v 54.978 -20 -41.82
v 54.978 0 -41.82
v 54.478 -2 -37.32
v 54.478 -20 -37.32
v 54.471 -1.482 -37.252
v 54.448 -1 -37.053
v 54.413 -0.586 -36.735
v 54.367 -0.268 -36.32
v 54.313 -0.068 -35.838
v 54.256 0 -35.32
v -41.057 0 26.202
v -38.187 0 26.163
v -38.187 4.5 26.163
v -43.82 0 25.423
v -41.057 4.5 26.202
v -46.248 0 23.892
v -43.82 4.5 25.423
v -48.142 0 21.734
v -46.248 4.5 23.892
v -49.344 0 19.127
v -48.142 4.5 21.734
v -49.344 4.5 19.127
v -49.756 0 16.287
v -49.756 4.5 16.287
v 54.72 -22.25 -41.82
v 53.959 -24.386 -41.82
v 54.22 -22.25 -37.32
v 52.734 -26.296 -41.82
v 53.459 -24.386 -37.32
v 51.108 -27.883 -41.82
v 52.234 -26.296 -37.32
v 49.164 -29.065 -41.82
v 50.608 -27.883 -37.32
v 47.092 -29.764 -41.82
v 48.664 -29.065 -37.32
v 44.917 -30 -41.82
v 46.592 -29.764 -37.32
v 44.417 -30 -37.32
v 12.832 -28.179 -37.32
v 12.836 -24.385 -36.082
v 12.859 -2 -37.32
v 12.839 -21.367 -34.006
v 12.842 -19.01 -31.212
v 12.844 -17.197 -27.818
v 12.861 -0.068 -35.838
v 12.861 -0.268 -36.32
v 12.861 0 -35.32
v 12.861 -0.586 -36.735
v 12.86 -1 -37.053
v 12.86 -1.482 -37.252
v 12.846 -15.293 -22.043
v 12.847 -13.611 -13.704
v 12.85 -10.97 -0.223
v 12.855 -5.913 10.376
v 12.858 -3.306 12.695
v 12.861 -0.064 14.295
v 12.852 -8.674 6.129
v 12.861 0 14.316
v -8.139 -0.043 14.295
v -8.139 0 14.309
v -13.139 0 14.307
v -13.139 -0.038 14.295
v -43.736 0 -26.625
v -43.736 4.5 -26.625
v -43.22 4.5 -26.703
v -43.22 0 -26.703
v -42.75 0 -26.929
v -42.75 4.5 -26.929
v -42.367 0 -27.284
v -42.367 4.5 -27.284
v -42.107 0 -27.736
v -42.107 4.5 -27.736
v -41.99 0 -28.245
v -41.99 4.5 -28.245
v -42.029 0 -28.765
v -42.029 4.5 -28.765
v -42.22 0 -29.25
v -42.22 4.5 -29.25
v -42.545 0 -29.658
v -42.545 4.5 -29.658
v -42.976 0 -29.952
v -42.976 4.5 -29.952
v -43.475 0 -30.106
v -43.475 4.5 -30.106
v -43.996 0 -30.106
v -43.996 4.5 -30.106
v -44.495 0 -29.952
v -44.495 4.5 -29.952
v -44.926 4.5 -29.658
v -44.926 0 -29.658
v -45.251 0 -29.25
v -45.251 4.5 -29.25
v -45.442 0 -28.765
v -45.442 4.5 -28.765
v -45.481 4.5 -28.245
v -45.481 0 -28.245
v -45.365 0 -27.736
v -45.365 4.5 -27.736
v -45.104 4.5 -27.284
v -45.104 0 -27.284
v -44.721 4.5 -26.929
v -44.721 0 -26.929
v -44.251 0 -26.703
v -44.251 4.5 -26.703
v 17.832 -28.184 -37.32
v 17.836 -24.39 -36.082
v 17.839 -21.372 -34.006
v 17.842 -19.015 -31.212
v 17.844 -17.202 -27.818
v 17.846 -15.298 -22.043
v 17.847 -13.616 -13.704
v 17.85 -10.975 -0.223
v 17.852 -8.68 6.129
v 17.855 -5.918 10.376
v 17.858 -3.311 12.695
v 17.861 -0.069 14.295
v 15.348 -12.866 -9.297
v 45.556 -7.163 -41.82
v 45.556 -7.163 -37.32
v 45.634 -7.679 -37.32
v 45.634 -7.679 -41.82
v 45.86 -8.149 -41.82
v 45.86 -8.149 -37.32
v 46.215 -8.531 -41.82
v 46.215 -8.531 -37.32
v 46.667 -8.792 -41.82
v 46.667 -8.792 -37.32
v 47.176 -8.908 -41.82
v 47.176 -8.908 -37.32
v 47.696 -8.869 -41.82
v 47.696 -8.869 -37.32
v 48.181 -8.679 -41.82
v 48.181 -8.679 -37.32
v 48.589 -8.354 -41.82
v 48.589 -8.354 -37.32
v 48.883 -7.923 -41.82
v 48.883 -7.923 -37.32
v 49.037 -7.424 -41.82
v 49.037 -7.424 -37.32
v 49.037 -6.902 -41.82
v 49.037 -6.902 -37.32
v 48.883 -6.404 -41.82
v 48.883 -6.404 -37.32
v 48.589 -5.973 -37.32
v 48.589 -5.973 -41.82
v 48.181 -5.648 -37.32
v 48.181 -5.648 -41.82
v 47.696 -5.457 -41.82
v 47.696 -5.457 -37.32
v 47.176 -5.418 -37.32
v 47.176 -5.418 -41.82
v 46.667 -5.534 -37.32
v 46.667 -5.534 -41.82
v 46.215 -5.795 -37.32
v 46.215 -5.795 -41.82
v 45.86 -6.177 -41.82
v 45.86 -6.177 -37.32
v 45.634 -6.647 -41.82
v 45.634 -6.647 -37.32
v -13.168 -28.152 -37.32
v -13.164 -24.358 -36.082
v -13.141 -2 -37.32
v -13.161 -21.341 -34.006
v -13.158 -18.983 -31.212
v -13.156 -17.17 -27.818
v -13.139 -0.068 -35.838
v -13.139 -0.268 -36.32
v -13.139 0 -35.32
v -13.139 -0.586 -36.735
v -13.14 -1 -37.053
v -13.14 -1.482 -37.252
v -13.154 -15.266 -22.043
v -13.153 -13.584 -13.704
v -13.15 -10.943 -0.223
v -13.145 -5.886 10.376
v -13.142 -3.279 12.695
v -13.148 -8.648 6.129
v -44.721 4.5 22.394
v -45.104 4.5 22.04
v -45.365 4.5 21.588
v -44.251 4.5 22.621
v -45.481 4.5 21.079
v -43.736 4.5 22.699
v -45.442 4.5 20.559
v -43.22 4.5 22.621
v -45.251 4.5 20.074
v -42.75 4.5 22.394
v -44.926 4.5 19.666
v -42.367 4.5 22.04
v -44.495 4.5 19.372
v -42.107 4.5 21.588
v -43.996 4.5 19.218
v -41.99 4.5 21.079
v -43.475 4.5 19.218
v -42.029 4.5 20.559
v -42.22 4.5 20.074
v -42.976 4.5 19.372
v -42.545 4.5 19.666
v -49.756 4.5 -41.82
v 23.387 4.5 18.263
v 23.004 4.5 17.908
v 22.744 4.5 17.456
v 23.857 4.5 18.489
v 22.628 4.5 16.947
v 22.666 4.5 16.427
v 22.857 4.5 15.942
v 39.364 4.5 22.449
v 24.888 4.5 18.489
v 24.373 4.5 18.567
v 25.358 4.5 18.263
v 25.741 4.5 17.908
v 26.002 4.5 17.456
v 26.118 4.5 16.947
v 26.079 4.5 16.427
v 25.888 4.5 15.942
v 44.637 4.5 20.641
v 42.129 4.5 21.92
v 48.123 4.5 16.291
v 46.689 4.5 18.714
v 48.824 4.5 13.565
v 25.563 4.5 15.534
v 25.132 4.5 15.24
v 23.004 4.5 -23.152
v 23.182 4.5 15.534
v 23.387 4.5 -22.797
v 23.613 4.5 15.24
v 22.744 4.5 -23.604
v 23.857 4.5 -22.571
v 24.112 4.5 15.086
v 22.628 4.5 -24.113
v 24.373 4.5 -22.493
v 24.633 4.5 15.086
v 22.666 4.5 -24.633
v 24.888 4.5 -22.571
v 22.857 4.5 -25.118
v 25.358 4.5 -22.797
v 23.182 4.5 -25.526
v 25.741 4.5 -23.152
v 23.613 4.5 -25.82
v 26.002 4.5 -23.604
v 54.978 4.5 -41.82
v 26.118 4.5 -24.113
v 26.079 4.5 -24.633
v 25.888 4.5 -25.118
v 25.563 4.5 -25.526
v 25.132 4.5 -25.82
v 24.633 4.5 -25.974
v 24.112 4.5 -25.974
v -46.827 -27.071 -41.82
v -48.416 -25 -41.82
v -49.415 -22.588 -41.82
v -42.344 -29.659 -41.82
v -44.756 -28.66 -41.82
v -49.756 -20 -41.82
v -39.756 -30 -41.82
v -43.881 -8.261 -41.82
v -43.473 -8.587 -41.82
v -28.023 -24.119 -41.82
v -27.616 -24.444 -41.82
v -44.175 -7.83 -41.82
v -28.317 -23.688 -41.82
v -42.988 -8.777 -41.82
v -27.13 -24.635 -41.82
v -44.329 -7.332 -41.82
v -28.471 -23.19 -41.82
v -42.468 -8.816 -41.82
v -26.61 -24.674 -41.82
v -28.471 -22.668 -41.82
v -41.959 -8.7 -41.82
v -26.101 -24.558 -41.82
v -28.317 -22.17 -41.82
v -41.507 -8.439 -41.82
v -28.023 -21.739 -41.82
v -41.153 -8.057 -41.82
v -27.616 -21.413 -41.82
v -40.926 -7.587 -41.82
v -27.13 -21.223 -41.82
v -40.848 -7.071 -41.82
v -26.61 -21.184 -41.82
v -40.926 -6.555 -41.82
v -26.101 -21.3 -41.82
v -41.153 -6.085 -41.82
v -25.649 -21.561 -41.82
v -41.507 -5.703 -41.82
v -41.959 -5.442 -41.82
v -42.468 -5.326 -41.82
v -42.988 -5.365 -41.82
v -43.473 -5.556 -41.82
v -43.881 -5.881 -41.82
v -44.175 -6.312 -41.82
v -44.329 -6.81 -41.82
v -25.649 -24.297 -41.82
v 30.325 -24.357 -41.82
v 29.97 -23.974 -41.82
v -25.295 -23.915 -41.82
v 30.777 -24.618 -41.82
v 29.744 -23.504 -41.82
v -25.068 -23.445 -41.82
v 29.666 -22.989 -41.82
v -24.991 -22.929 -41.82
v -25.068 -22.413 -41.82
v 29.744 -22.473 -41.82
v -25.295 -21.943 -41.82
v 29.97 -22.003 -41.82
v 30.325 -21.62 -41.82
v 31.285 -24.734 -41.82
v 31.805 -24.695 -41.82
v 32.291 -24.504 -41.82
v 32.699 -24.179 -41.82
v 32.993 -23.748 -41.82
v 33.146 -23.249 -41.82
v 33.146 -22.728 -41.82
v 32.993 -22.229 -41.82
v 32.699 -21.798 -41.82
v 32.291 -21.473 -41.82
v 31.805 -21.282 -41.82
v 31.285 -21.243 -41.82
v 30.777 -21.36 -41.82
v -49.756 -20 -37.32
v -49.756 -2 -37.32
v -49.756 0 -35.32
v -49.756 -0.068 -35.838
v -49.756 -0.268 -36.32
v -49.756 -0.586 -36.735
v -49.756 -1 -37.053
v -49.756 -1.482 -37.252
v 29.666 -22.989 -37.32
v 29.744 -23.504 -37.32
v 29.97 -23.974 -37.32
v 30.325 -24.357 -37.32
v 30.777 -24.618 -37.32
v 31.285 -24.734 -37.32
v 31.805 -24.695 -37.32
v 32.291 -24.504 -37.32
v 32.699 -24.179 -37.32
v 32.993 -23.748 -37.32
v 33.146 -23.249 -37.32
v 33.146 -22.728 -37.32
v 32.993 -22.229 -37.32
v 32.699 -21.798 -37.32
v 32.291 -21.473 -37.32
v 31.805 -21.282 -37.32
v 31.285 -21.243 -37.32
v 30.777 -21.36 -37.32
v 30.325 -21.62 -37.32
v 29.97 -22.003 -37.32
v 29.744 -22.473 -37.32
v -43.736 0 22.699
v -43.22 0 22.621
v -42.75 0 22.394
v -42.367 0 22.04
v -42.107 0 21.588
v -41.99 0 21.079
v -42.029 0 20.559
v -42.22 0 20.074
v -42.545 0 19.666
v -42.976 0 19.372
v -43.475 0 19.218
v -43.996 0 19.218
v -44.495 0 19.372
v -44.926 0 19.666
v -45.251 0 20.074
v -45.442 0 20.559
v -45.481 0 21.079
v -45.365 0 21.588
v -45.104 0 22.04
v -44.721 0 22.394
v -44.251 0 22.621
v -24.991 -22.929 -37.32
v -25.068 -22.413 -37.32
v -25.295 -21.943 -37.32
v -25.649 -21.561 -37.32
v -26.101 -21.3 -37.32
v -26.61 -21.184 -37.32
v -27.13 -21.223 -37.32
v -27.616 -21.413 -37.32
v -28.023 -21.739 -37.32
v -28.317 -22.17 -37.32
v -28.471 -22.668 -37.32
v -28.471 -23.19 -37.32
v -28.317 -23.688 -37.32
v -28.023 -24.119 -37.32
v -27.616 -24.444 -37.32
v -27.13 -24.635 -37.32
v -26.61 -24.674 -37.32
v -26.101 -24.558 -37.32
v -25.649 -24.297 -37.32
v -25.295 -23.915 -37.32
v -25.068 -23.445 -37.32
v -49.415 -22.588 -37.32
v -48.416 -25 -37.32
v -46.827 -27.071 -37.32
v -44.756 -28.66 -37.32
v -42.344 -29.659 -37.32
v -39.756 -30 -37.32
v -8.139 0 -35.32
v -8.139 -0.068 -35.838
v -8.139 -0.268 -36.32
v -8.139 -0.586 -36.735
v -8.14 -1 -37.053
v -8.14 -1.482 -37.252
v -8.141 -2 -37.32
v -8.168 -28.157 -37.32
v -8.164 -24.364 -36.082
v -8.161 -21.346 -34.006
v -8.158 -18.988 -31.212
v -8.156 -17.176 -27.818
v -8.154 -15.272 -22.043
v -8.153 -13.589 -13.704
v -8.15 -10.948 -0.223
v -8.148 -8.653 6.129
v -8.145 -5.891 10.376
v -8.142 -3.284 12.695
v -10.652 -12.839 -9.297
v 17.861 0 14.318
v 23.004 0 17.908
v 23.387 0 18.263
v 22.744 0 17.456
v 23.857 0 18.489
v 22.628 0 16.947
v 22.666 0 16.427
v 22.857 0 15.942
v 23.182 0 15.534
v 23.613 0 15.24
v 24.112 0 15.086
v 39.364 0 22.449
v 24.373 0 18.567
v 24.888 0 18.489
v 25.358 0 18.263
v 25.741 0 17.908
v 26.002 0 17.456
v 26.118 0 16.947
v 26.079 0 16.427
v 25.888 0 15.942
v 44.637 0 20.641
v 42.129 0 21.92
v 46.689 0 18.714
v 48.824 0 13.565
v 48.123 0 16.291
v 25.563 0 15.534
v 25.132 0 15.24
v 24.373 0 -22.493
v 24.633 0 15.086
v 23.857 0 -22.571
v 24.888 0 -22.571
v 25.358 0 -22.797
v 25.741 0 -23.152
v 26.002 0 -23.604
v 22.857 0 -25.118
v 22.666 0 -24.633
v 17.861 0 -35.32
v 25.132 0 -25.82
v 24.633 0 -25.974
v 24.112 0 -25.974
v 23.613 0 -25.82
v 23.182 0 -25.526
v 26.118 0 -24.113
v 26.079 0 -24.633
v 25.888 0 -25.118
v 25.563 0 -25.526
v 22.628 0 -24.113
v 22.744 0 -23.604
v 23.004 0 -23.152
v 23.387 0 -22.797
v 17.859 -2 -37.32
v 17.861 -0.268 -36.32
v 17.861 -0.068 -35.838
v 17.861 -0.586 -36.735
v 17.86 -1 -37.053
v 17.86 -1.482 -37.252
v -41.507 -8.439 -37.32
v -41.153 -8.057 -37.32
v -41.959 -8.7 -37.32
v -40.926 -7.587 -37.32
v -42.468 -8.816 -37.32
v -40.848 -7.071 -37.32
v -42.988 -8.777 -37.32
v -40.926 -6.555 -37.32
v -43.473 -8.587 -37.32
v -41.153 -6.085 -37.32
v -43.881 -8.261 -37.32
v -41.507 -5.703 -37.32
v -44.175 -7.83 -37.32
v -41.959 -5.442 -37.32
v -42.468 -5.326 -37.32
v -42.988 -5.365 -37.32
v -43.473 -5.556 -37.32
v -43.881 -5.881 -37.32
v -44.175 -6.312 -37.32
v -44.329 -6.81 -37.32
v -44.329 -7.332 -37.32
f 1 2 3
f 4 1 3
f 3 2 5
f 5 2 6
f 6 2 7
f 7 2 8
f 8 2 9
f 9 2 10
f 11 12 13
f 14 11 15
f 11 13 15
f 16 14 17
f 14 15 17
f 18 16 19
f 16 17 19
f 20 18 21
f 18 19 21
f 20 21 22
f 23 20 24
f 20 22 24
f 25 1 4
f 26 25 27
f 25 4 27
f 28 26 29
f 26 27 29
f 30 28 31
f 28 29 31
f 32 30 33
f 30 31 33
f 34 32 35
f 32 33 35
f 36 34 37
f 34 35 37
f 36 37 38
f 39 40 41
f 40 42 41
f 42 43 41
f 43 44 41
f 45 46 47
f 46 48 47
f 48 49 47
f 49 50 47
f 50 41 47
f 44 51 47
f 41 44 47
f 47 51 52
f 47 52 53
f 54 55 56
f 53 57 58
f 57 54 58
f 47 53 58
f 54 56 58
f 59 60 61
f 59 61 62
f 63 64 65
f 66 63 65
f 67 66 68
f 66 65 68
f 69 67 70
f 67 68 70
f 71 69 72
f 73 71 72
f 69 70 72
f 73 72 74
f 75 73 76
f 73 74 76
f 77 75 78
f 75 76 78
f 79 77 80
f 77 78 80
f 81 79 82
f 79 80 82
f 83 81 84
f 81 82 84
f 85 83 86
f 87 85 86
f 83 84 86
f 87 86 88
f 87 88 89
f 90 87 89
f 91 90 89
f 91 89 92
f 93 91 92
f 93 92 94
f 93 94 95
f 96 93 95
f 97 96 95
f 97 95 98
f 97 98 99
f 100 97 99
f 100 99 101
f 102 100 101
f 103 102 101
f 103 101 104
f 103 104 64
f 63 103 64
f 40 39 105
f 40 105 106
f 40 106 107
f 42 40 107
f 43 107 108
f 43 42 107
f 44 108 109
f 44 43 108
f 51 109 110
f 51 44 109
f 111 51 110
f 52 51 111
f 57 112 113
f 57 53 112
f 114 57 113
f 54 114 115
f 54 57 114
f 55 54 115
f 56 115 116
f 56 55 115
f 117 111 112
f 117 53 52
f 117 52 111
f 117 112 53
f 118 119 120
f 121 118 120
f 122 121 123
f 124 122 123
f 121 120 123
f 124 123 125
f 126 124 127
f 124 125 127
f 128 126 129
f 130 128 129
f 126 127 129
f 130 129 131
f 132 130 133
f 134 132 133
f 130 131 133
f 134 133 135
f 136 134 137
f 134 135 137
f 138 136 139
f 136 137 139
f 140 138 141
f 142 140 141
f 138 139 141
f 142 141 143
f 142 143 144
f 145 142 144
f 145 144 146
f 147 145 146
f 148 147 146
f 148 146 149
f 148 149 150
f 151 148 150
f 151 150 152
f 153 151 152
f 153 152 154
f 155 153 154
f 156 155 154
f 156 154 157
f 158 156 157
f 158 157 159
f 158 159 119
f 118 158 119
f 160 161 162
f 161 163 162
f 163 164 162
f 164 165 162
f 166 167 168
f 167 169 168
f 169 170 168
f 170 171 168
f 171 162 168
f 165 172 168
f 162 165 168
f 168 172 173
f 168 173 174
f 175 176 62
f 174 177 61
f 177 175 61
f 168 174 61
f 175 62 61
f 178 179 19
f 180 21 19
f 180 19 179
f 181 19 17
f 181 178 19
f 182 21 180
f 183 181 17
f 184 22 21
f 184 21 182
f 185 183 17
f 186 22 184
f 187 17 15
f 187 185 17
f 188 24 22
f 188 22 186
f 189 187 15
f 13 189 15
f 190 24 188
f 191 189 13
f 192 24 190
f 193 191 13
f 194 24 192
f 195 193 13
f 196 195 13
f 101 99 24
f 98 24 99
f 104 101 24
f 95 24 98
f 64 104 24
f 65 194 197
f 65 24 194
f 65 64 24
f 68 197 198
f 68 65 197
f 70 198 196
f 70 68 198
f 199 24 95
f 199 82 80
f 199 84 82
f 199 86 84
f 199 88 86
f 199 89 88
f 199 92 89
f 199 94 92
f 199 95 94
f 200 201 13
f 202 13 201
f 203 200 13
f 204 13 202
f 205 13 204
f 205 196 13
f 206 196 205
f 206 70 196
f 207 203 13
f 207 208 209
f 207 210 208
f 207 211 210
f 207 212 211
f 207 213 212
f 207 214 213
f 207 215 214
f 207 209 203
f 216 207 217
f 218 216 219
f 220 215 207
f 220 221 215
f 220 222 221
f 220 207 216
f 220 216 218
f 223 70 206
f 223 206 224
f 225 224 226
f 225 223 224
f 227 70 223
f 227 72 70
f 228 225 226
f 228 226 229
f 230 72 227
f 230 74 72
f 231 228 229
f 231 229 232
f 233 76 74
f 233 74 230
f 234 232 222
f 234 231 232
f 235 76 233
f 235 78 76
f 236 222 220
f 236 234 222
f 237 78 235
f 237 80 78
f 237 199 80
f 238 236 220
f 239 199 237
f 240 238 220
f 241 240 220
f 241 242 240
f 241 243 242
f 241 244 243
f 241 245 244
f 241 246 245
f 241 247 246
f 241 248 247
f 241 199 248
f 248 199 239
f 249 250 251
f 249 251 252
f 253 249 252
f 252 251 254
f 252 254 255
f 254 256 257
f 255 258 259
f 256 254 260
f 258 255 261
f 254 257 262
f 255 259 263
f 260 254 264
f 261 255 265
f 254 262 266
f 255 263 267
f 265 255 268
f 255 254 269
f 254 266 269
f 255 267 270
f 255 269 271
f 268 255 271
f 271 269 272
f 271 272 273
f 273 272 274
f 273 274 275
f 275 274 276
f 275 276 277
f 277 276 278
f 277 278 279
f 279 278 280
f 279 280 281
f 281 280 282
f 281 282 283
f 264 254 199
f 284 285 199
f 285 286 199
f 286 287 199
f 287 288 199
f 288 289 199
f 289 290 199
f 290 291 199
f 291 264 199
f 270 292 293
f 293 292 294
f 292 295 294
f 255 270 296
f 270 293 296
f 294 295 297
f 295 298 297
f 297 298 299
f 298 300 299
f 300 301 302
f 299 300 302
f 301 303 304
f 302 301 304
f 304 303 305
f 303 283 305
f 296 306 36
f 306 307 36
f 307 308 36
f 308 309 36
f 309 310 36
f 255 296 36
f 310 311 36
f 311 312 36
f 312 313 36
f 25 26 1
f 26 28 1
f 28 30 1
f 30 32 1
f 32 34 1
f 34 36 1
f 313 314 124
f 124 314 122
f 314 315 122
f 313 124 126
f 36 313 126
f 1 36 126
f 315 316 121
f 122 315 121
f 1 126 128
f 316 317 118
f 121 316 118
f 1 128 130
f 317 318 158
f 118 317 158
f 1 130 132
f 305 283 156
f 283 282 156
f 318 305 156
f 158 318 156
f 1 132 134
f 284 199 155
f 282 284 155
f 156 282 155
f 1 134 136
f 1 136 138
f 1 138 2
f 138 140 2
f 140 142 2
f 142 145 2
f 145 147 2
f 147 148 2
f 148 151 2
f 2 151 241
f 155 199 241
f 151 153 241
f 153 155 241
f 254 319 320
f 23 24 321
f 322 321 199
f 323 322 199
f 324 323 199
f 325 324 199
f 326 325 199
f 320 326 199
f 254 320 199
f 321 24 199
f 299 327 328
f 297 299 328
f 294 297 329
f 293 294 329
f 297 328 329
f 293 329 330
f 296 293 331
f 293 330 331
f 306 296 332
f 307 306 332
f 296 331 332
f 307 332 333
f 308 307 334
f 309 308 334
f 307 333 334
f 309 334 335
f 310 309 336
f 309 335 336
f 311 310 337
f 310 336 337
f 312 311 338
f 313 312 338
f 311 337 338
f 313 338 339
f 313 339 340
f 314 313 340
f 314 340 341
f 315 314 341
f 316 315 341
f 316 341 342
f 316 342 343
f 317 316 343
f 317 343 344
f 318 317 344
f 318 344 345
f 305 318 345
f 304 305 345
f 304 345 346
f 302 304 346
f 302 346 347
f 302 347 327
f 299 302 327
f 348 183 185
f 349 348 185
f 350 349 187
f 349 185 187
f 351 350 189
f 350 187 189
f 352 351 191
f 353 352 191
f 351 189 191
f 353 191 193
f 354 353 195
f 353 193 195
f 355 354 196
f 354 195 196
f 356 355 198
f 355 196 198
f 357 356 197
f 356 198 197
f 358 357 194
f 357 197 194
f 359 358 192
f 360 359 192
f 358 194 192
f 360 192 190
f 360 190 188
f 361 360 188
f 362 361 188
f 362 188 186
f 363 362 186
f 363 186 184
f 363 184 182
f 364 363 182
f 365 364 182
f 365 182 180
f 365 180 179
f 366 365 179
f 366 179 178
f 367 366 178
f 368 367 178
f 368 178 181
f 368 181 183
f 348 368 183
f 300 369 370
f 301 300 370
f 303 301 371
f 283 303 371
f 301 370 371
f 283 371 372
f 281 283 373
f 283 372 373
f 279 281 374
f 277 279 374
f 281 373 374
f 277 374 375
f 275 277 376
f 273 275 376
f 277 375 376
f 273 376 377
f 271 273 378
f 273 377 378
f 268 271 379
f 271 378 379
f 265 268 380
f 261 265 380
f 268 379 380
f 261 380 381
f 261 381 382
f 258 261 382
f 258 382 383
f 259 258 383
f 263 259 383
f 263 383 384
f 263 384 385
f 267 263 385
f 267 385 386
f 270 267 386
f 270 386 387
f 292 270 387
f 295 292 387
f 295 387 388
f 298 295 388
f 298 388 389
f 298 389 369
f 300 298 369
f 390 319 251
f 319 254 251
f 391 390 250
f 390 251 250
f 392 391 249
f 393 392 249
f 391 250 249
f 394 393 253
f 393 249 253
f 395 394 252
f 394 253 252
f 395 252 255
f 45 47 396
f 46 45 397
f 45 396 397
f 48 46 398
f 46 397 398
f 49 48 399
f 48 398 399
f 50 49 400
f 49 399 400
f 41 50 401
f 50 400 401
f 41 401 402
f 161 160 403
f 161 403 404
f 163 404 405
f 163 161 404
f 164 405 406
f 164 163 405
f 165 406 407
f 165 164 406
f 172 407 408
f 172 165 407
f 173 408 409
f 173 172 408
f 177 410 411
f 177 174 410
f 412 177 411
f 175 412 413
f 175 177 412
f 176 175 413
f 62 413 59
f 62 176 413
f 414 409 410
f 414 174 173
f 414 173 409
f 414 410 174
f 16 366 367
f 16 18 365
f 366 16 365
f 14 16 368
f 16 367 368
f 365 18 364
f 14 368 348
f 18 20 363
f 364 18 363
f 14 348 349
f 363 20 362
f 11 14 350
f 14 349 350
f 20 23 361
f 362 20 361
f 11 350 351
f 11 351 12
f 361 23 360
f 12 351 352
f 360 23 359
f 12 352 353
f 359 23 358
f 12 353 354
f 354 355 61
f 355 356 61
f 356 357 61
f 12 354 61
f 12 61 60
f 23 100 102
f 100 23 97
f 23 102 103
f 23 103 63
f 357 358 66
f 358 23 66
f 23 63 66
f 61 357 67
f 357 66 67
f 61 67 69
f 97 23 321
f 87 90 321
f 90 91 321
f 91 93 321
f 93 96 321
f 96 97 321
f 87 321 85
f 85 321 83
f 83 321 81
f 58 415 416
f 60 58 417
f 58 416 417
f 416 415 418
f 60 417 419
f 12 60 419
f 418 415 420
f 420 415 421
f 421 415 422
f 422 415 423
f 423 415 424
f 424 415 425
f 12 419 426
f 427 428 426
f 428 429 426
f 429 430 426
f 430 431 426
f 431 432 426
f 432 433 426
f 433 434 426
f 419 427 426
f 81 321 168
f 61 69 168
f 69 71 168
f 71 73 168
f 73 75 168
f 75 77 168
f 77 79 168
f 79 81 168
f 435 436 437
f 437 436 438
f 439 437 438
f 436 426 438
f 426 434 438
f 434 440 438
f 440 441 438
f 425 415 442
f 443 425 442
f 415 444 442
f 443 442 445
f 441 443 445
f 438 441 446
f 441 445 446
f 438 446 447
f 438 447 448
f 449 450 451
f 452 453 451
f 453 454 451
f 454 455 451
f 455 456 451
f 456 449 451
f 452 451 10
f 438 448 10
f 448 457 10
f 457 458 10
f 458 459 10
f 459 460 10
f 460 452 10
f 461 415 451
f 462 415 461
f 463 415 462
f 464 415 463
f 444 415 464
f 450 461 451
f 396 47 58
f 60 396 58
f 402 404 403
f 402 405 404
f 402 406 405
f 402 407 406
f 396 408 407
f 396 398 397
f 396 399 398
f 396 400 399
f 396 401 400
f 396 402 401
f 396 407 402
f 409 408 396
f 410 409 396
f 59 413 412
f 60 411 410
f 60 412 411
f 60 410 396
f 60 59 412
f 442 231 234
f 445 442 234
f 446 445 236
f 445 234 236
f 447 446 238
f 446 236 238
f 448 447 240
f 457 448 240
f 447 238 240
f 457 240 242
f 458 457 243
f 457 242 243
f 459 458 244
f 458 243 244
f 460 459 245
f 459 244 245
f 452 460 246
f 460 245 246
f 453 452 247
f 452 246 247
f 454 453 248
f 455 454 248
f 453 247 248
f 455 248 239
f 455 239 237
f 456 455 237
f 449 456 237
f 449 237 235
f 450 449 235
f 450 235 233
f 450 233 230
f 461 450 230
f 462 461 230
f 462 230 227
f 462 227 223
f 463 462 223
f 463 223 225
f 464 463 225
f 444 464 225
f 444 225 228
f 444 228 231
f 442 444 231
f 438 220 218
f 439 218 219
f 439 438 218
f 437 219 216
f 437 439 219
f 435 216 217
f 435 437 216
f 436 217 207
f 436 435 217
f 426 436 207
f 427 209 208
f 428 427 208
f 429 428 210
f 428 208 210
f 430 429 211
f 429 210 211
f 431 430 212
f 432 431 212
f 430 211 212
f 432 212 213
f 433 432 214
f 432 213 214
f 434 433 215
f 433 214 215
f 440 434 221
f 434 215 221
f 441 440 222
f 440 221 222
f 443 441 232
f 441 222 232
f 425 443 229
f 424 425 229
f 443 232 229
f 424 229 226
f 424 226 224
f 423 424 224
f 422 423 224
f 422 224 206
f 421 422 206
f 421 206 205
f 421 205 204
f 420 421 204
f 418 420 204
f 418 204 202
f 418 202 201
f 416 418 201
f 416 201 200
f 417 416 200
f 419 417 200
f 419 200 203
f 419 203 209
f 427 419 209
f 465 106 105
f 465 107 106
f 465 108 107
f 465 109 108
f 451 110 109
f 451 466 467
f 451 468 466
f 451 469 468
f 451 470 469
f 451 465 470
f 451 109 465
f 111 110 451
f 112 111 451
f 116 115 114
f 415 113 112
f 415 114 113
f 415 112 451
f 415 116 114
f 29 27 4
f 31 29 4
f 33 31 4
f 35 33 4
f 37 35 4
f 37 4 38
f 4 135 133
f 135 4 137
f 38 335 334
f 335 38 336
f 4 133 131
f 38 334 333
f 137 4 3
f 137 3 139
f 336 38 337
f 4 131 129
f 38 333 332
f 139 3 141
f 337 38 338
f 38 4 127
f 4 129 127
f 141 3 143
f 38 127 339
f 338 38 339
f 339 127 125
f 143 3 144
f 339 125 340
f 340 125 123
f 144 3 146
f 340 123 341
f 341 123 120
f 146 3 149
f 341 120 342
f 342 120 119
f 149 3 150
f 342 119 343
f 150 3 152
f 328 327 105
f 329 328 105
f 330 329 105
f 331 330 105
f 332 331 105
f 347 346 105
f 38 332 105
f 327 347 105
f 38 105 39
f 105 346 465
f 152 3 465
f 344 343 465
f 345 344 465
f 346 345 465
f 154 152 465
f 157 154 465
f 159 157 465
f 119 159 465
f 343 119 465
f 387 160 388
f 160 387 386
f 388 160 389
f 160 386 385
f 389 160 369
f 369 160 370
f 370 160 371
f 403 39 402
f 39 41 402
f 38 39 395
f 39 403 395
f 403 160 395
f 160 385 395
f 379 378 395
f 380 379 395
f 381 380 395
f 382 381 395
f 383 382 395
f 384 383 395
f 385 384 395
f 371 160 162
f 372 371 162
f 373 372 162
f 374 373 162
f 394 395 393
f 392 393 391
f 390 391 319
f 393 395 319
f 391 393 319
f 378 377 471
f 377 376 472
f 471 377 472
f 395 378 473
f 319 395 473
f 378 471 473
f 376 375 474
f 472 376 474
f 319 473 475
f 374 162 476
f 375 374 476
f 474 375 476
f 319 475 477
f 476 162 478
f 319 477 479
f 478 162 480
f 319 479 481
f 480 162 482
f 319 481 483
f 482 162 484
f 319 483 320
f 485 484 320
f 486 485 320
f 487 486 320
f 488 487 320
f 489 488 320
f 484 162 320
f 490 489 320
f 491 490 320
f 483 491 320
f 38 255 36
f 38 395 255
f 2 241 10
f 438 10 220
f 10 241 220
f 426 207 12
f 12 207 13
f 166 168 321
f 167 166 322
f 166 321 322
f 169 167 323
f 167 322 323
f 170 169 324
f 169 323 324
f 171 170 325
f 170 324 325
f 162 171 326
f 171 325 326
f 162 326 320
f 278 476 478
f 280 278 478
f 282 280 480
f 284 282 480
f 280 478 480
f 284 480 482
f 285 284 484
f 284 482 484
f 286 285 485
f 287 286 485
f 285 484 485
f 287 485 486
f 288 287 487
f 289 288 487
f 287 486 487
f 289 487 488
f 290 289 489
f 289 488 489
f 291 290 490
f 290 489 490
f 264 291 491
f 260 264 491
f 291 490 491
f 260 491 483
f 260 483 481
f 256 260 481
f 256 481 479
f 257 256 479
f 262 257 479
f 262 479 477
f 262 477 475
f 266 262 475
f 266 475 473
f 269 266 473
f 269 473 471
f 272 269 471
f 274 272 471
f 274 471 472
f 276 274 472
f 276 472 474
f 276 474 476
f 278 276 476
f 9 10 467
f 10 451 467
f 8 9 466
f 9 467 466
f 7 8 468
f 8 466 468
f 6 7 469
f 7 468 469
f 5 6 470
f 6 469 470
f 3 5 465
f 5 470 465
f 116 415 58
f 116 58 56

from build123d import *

# Parameters (mm, degrees)
SKETCH2_W           = 132.54933421
SKETCH2_H           = 96.472398488
BOSS_EXTRUDE1_DEPTH = 4.5
CUT_EXTRUDE1_REACH  = 84.093
SKETCH3_R           = 1.75
CUT_EXTRUDE2_REACH  = 84.093
SKETCH4_W           = 132.54933421
SKETCH4_H           = 96.472398488
FILLET1_R           = 10
BOSS_EXTRUDE2_DEPTH = 30
FILLET2_R           = 10
CUT_EXTRUDE3_REACH  = 91.266
SKETCH6_R           = 1.75
RIB1_START          = -2.5
RIB1_DEPTH          = 5
RIB2_START          = -2.5
RIB2_DEPTH          = 5
FILLET3_R           = 2


with BuildPart() as part:
    # Sketch2 → Boss-Extrude1 (new body)
    with BuildSketch(Plane(origin=(0, 0, 0), x_dir=(1, 0, 0), z_dir=(0, 1, 0))):
        Rectangle(SKETCH2_W, SKETCH2_H)
    extrude(amount=BOSS_EXTRUDE1_DEPTH)

    # Sketch3 → Cut-Extrude1 (cut, up to next)
    with BuildSketch(Plane(origin=(0, 4.5, 0), x_dir=(1, 0, 0), z_dir=(0, 1, 0)), mode=Mode.PRIVATE) as cut_extrude1_sk1:
        with Locations(Location((-43.735552551, 28.375291395, 0), (0, 0, 270))):
            Circle(SKETCH3_R)
    cut_extrude1_tool1 = extrude(cut_extrude1_sk1.sketch, amount=-CUT_EXTRUDE1_REACH, mode=Mode.PRIVATE) & part.part
    # Sketch3 → Cut-Extrude1 (cut, up to next)
    with BuildSketch(Plane(origin=(0, 4.5, 0), x_dir=(1, 0, 0), z_dir=(0, 1, 0)), mode=Mode.PRIVATE) as cut_extrude1_sk2:
        with Locations(Location((-43.735552551, -20.948558002, 0), (0, 0, 270))):
            Circle(SKETCH3_R)
    cut_extrude1_tool2 = extrude(cut_extrude1_sk2.sketch, amount=-CUT_EXTRUDE1_REACH, mode=Mode.PRIVATE) & part.part
    # Sketch3 → Cut-Extrude1 (cut, up to next)
    with BuildSketch(Plane(origin=(0, 4.5, 0), x_dir=(1, 0, 0), z_dir=(0, 1, 0)), mode=Mode.PRIVATE) as cut_extrude1_sk3:
        with Locations(Location((24.372618491, -16.816583266, 0), (0, 0, 270))):
            Circle(SKETCH3_R)
    cut_extrude1_tool3 = extrude(cut_extrude1_sk3.sketch, amount=-CUT_EXTRUDE1_REACH, mode=Mode.PRIVATE) & part.part
    # Sketch3 → Cut-Extrude1 (cut, up to next)
    with BuildSketch(Plane(origin=(0, 4.5, 0), x_dir=(1, 0, 0), z_dir=(0, 1, 0)), mode=Mode.PRIVATE) as cut_extrude1_sk4:
        with Locations(Location((24.372618491, 24.243316659, 0), (0, 0, 270))):
            Circle(SKETCH3_R)
    cut_extrude1_tool4 = extrude(cut_extrude1_sk4.sketch, amount=-CUT_EXTRUDE1_REACH, mode=Mode.PRIVATE) & part.part
    add(cut_extrude1_tool1.solids().sort_by_distance((-43.735553, 4.5, -28.375291))[0], mode=Mode.SUBTRACT)
    add(cut_extrude1_tool2.solids().sort_by_distance((-43.735553, 4.5, 20.948558))[0], mode=Mode.SUBTRACT)
    add(cut_extrude1_tool3.solids().sort_by_distance((24.372618, 4.5, 16.816583))[0], mode=Mode.SUBTRACT)
    add(cut_extrude1_tool4.solids().sort_by_distance((24.372618, 4.5, -24.243317))[0], mode=Mode.SUBTRACT)

    # Sketch4 → Cut-Extrude2 (cut, up to next)
    with BuildSketch(Plane(origin=(0, 4.5, 0), x_dir=(1, 0, 0), z_dir=(0, 1, 0)), mode=Mode.PRIVATE) as cut_extrude2_sk1:
        Rectangle(SKETCH4_W, SKETCH4_H)
        with BuildLine():
            Line((-49.755679651, -16.286633303), (-49.755679651, 41.820488279))
            Line((-49.755679651, 41.820488279), (54.978186069, 41.820488279))
            Line((54.978186069, 41.820488279), (47.882417092, -22.041432557))
            Line((47.882417092, -22.041432557), (-38.186956222, -26.162822184))
            ThreePointArc((-38.186956222, -26.162822184), (-46.248474339, -23.892132442), (-49.755679651, -16.286633303))
        make_face(mode=Mode.SUBTRACT)
    cut_extrude2_tool1 = extrude(cut_extrude2_sk1.sketch, amount=-CUT_EXTRUDE2_REACH, mode=Mode.PRIVATE) & part.part
    add(cut_extrude2_tool1.solids().sort_by_distance((-64.635269, 4.5, 0))[0], mode=Mode.SUBTRACT)

    # Fillet1
    fillet1_edges = [part.edges().sort_by_distance(p)[0] for p in [
        (47.882417092, 2.25, 22.041432557),
    ]]
    fillet(fillet1_edges, radius=FILLET1_R)

    # Sketch5 → Boss-Extrude2 (add)
    with BuildSketch(Plane.XZ):
        Polygon((-49.755679651, -37.320488279), (-49.755679651, -41.820488279), (54.978186069, -41.820488279), (54.478186069, -37.320488279), align=None)
    extrude(amount=BOSS_EXTRUDE2_DEPTH)

    # Fillet2
    fillet2_edges = [part.edges().sort_by_distance(p)[0] for p in [
        (-49.755679651, -30, -39.570488279),
        (54.728186069, -30, -39.570488279),
    ]]
    fillet(fillet2_edges, radius=FILLET2_R)

    # Sketch6 → Cut-Extrude3 (cut, up to next)
    with BuildSketch(Plane.XY.offset(-37.320488279), mode=Mode.PRIVATE) as cut_extrude3_sk1:
        with Locations((-42.5984485, -7.071067812)):
            Circle(SKETCH6_R)
    cut_extrude3_tool1 = extrude(cut_extrude3_sk1.sketch, amount=-CUT_EXTRUDE3_REACH, mode=Mode.PRIVATE) & part.part
    # Sketch6 → Cut-Extrude3 (cut, up to next)
    with BuildSketch(Plane.XY.offset(-37.320488279), mode=Mode.PRIVATE) as cut_extrude3_sk2:
        with Locations((-26.740584124, -22.928932188)):
            Circle(SKETCH6_R)
    cut_extrude3_tool2 = extrude(cut_extrude3_sk2.sketch, amount=-CUT_EXTRUDE3_REACH, mode=Mode.PRIVATE) & part.part
    # Sketch6 → Cut-Extrude3 (cut, up to next)
    with BuildSketch(Plane.XY.offset(-37.320488279), mode=Mode.PRIVATE) as cut_extrude3_sk3:
        with Locations(Location((31.415995213, -22.988580525, 0), (0, 0, 180))):
            Circle(SKETCH6_R)
    cut_extrude3_tool3 = extrude(cut_extrude3_sk3.sketch, amount=-CUT_EXTRUDE3_REACH, mode=Mode.PRIVATE) & part.part
    # Sketch6 → Cut-Extrude3 (cut, up to next)
    with BuildSketch(Plane.XY.offset(-37.320488279), mode=Mode.PRIVATE) as cut_extrude3_sk4:
        with Locations(Location((47.306355451, -7.163278737, 0), (0, 0, 180))):
            Circle(SKETCH6_R)
    cut_extrude3_tool4 = extrude(cut_extrude3_sk4.sketch, amount=-CUT_EXTRUDE3_REACH, mode=Mode.PRIVATE) & part.part
    add(cut_extrude3_tool1.solids().sort_by_distance((-42.598449, -7.071068, -37.320488))[0], mode=Mode.SUBTRACT)
    add(cut_extrude3_tool2.solids().sort_by_distance((-26.740584, -22.928932, -37.320488))[0], mode=Mode.SUBTRACT)
    add(cut_extrude3_tool3.solids().sort_by_distance((31.415995, -22.988581, -37.320488))[0], mode=Mode.SUBTRACT)
    add(cut_extrude3_tool4.solids().sort_by_distance((47.306355, -7.163279, -37.320488))[0], mode=Mode.SUBTRACT)

    # Rib1: read off the stored shape, not the designer's step
    # Rib1 outline → Rib1 (add)
    with BuildSketch(Plane(origin=(-10.638742437, 0.010911634, 0), x_dir=(0.001025650165390613, 0.9999994740207309, 0), z_dir=(0.9999994740207307, -0.0010256501653906128, 0)).offset(RIB1_START)):
        with BuildLine():
            Line((-0.008347513, -37.320488279), (-0.008347513, 14.309096835))
            Line((-0.008347513, 14.309096835), (-0.051031921, 14.294776029))
            add(Edge.make_bspline(
                [(-28.165704325, -37.320488279), (-16.507311445, -35.163666341), (-13.858586231, -11.343701008), (-8.750641214, 11.37601897), (-0.051031921, 14.294776029)],
                knots=[0, 0, 0, 0, 0.549950709, 1, 1, 1, 1], degree=3))
            Line((-28.165704325, -37.320488279), (-0.008347513, -37.320488279))
        make_face()
    extrude(amount=RIB1_DEPTH)

    # Rib2: read off the stored shape, not the designer's step
    # Rib2 outline → Rib2 (add)
    with BuildSketch(Plane(origin=(15.361243887, -0.015755271, 0), x_dir=(0.001025650165390613, 0.9999994740207309, 0), z_dir=(0.9999994740207307, -0.0010256501653906128, 0)).offset(RIB2_START)):
        with BuildLine():
            Line((0.018319406, -37.320488279), (0.018319406, 14.318043703))
            Line((0.018319406, 14.318043703), (-0.051031921, 14.294776029))
            add(Edge.make_bspline(
                [(-28.165704325, -37.320488279), (-16.507311445, -35.163666341), (-13.858586231, -11.343701008), (-8.750641214, 11.37601897), (-0.051031921, 14.294776029)],
                knots=[0, 0, 0, 0, 0.549950709, 1, 1, 1, 1], degree=3))
            Line((-28.165704325, -37.320488279), (0.018319406, -37.320488279))
        make_face()
    extrude(amount=RIB2_DEPTH)

    # Fillet3
    fillet3_edges = [part.edges().sort_by_distance(p)[0] for p in [
        (-31.447217297, 0, -37.320488279),
        (2.361253209, 0, -37.320488279),
        (36.169723715, 0, -37.320488279),
    ]]
    fillet(fillet3_edges, radius=FILLET3_R)


solid = part.part
